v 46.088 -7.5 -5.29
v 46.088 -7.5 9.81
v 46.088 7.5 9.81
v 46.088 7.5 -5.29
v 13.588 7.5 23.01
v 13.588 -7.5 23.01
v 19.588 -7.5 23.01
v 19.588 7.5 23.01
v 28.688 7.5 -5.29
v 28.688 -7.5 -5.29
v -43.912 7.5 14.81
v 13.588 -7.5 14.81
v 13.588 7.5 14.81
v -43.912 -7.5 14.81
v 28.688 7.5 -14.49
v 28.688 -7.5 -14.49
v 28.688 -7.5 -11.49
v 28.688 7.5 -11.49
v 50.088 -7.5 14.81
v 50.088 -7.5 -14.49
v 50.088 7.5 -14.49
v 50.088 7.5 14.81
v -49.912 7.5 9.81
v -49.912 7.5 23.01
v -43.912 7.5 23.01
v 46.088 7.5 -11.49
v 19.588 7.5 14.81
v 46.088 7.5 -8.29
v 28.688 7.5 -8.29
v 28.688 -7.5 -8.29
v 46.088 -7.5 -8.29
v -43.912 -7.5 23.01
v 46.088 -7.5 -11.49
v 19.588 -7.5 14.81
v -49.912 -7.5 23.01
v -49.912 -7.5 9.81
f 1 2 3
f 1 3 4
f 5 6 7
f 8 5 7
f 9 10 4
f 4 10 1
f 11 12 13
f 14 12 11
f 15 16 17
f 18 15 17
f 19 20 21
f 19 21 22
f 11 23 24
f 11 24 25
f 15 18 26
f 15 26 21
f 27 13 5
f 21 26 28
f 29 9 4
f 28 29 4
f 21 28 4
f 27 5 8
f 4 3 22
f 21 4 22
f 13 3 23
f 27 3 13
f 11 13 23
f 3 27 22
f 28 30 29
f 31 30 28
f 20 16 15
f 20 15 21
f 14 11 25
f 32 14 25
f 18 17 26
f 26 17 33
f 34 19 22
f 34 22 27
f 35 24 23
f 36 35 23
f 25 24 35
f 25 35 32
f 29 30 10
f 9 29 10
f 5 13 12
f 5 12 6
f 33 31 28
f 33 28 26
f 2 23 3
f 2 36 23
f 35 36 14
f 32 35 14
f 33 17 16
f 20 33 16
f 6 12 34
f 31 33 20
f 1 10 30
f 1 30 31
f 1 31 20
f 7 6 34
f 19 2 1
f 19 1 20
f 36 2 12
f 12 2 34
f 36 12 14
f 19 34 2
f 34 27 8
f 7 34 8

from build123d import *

# Parameters (mm, degrees)
F0_W     = 6
F0_H     = 8.2
F0_W_2   = 17.4
F0_H_2   = 3
F1_DEPTH = 7.5


with BuildPart() as f1:
    # F0 (on Front) → F1 (new body, symmetric)
    with BuildSketch(Plane.XZ):
        Polygon((-49.911916, 14.810329), (-49.911916, 9.810329), (46.088084, 9.810329), (50.088084, 9.810329), (50.088084, 14.810329), (19.588084, 14.810329), (13.588084, 14.810329), (-43.911916, 14.810329), align=None)
        with Locations((16.588084, 18.910329)):
            Rectangle(F0_W, F0_H)
        with Locations((-46.911916, 18.910329)):
            Rectangle(F0_W, F0_H)
        Polygon((50.088084, 9.810329), (46.088084, 9.810329), (46.088084, -5.289671), (46.088084, -8.289671), (46.088084, -11.489671), (46.088084, -14.489671), (50.088084, -14.489671), align=None)
        with Locations((37.388084, -6.789671)):
            Rectangle(F0_W_2, F0_H_2)
        with Locations((37.388084, -12.989671)):
            Rectangle(F0_W_2, F0_H_2)
    extrude(amount=F1_DEPTH, both=True)


solid = f1.part
